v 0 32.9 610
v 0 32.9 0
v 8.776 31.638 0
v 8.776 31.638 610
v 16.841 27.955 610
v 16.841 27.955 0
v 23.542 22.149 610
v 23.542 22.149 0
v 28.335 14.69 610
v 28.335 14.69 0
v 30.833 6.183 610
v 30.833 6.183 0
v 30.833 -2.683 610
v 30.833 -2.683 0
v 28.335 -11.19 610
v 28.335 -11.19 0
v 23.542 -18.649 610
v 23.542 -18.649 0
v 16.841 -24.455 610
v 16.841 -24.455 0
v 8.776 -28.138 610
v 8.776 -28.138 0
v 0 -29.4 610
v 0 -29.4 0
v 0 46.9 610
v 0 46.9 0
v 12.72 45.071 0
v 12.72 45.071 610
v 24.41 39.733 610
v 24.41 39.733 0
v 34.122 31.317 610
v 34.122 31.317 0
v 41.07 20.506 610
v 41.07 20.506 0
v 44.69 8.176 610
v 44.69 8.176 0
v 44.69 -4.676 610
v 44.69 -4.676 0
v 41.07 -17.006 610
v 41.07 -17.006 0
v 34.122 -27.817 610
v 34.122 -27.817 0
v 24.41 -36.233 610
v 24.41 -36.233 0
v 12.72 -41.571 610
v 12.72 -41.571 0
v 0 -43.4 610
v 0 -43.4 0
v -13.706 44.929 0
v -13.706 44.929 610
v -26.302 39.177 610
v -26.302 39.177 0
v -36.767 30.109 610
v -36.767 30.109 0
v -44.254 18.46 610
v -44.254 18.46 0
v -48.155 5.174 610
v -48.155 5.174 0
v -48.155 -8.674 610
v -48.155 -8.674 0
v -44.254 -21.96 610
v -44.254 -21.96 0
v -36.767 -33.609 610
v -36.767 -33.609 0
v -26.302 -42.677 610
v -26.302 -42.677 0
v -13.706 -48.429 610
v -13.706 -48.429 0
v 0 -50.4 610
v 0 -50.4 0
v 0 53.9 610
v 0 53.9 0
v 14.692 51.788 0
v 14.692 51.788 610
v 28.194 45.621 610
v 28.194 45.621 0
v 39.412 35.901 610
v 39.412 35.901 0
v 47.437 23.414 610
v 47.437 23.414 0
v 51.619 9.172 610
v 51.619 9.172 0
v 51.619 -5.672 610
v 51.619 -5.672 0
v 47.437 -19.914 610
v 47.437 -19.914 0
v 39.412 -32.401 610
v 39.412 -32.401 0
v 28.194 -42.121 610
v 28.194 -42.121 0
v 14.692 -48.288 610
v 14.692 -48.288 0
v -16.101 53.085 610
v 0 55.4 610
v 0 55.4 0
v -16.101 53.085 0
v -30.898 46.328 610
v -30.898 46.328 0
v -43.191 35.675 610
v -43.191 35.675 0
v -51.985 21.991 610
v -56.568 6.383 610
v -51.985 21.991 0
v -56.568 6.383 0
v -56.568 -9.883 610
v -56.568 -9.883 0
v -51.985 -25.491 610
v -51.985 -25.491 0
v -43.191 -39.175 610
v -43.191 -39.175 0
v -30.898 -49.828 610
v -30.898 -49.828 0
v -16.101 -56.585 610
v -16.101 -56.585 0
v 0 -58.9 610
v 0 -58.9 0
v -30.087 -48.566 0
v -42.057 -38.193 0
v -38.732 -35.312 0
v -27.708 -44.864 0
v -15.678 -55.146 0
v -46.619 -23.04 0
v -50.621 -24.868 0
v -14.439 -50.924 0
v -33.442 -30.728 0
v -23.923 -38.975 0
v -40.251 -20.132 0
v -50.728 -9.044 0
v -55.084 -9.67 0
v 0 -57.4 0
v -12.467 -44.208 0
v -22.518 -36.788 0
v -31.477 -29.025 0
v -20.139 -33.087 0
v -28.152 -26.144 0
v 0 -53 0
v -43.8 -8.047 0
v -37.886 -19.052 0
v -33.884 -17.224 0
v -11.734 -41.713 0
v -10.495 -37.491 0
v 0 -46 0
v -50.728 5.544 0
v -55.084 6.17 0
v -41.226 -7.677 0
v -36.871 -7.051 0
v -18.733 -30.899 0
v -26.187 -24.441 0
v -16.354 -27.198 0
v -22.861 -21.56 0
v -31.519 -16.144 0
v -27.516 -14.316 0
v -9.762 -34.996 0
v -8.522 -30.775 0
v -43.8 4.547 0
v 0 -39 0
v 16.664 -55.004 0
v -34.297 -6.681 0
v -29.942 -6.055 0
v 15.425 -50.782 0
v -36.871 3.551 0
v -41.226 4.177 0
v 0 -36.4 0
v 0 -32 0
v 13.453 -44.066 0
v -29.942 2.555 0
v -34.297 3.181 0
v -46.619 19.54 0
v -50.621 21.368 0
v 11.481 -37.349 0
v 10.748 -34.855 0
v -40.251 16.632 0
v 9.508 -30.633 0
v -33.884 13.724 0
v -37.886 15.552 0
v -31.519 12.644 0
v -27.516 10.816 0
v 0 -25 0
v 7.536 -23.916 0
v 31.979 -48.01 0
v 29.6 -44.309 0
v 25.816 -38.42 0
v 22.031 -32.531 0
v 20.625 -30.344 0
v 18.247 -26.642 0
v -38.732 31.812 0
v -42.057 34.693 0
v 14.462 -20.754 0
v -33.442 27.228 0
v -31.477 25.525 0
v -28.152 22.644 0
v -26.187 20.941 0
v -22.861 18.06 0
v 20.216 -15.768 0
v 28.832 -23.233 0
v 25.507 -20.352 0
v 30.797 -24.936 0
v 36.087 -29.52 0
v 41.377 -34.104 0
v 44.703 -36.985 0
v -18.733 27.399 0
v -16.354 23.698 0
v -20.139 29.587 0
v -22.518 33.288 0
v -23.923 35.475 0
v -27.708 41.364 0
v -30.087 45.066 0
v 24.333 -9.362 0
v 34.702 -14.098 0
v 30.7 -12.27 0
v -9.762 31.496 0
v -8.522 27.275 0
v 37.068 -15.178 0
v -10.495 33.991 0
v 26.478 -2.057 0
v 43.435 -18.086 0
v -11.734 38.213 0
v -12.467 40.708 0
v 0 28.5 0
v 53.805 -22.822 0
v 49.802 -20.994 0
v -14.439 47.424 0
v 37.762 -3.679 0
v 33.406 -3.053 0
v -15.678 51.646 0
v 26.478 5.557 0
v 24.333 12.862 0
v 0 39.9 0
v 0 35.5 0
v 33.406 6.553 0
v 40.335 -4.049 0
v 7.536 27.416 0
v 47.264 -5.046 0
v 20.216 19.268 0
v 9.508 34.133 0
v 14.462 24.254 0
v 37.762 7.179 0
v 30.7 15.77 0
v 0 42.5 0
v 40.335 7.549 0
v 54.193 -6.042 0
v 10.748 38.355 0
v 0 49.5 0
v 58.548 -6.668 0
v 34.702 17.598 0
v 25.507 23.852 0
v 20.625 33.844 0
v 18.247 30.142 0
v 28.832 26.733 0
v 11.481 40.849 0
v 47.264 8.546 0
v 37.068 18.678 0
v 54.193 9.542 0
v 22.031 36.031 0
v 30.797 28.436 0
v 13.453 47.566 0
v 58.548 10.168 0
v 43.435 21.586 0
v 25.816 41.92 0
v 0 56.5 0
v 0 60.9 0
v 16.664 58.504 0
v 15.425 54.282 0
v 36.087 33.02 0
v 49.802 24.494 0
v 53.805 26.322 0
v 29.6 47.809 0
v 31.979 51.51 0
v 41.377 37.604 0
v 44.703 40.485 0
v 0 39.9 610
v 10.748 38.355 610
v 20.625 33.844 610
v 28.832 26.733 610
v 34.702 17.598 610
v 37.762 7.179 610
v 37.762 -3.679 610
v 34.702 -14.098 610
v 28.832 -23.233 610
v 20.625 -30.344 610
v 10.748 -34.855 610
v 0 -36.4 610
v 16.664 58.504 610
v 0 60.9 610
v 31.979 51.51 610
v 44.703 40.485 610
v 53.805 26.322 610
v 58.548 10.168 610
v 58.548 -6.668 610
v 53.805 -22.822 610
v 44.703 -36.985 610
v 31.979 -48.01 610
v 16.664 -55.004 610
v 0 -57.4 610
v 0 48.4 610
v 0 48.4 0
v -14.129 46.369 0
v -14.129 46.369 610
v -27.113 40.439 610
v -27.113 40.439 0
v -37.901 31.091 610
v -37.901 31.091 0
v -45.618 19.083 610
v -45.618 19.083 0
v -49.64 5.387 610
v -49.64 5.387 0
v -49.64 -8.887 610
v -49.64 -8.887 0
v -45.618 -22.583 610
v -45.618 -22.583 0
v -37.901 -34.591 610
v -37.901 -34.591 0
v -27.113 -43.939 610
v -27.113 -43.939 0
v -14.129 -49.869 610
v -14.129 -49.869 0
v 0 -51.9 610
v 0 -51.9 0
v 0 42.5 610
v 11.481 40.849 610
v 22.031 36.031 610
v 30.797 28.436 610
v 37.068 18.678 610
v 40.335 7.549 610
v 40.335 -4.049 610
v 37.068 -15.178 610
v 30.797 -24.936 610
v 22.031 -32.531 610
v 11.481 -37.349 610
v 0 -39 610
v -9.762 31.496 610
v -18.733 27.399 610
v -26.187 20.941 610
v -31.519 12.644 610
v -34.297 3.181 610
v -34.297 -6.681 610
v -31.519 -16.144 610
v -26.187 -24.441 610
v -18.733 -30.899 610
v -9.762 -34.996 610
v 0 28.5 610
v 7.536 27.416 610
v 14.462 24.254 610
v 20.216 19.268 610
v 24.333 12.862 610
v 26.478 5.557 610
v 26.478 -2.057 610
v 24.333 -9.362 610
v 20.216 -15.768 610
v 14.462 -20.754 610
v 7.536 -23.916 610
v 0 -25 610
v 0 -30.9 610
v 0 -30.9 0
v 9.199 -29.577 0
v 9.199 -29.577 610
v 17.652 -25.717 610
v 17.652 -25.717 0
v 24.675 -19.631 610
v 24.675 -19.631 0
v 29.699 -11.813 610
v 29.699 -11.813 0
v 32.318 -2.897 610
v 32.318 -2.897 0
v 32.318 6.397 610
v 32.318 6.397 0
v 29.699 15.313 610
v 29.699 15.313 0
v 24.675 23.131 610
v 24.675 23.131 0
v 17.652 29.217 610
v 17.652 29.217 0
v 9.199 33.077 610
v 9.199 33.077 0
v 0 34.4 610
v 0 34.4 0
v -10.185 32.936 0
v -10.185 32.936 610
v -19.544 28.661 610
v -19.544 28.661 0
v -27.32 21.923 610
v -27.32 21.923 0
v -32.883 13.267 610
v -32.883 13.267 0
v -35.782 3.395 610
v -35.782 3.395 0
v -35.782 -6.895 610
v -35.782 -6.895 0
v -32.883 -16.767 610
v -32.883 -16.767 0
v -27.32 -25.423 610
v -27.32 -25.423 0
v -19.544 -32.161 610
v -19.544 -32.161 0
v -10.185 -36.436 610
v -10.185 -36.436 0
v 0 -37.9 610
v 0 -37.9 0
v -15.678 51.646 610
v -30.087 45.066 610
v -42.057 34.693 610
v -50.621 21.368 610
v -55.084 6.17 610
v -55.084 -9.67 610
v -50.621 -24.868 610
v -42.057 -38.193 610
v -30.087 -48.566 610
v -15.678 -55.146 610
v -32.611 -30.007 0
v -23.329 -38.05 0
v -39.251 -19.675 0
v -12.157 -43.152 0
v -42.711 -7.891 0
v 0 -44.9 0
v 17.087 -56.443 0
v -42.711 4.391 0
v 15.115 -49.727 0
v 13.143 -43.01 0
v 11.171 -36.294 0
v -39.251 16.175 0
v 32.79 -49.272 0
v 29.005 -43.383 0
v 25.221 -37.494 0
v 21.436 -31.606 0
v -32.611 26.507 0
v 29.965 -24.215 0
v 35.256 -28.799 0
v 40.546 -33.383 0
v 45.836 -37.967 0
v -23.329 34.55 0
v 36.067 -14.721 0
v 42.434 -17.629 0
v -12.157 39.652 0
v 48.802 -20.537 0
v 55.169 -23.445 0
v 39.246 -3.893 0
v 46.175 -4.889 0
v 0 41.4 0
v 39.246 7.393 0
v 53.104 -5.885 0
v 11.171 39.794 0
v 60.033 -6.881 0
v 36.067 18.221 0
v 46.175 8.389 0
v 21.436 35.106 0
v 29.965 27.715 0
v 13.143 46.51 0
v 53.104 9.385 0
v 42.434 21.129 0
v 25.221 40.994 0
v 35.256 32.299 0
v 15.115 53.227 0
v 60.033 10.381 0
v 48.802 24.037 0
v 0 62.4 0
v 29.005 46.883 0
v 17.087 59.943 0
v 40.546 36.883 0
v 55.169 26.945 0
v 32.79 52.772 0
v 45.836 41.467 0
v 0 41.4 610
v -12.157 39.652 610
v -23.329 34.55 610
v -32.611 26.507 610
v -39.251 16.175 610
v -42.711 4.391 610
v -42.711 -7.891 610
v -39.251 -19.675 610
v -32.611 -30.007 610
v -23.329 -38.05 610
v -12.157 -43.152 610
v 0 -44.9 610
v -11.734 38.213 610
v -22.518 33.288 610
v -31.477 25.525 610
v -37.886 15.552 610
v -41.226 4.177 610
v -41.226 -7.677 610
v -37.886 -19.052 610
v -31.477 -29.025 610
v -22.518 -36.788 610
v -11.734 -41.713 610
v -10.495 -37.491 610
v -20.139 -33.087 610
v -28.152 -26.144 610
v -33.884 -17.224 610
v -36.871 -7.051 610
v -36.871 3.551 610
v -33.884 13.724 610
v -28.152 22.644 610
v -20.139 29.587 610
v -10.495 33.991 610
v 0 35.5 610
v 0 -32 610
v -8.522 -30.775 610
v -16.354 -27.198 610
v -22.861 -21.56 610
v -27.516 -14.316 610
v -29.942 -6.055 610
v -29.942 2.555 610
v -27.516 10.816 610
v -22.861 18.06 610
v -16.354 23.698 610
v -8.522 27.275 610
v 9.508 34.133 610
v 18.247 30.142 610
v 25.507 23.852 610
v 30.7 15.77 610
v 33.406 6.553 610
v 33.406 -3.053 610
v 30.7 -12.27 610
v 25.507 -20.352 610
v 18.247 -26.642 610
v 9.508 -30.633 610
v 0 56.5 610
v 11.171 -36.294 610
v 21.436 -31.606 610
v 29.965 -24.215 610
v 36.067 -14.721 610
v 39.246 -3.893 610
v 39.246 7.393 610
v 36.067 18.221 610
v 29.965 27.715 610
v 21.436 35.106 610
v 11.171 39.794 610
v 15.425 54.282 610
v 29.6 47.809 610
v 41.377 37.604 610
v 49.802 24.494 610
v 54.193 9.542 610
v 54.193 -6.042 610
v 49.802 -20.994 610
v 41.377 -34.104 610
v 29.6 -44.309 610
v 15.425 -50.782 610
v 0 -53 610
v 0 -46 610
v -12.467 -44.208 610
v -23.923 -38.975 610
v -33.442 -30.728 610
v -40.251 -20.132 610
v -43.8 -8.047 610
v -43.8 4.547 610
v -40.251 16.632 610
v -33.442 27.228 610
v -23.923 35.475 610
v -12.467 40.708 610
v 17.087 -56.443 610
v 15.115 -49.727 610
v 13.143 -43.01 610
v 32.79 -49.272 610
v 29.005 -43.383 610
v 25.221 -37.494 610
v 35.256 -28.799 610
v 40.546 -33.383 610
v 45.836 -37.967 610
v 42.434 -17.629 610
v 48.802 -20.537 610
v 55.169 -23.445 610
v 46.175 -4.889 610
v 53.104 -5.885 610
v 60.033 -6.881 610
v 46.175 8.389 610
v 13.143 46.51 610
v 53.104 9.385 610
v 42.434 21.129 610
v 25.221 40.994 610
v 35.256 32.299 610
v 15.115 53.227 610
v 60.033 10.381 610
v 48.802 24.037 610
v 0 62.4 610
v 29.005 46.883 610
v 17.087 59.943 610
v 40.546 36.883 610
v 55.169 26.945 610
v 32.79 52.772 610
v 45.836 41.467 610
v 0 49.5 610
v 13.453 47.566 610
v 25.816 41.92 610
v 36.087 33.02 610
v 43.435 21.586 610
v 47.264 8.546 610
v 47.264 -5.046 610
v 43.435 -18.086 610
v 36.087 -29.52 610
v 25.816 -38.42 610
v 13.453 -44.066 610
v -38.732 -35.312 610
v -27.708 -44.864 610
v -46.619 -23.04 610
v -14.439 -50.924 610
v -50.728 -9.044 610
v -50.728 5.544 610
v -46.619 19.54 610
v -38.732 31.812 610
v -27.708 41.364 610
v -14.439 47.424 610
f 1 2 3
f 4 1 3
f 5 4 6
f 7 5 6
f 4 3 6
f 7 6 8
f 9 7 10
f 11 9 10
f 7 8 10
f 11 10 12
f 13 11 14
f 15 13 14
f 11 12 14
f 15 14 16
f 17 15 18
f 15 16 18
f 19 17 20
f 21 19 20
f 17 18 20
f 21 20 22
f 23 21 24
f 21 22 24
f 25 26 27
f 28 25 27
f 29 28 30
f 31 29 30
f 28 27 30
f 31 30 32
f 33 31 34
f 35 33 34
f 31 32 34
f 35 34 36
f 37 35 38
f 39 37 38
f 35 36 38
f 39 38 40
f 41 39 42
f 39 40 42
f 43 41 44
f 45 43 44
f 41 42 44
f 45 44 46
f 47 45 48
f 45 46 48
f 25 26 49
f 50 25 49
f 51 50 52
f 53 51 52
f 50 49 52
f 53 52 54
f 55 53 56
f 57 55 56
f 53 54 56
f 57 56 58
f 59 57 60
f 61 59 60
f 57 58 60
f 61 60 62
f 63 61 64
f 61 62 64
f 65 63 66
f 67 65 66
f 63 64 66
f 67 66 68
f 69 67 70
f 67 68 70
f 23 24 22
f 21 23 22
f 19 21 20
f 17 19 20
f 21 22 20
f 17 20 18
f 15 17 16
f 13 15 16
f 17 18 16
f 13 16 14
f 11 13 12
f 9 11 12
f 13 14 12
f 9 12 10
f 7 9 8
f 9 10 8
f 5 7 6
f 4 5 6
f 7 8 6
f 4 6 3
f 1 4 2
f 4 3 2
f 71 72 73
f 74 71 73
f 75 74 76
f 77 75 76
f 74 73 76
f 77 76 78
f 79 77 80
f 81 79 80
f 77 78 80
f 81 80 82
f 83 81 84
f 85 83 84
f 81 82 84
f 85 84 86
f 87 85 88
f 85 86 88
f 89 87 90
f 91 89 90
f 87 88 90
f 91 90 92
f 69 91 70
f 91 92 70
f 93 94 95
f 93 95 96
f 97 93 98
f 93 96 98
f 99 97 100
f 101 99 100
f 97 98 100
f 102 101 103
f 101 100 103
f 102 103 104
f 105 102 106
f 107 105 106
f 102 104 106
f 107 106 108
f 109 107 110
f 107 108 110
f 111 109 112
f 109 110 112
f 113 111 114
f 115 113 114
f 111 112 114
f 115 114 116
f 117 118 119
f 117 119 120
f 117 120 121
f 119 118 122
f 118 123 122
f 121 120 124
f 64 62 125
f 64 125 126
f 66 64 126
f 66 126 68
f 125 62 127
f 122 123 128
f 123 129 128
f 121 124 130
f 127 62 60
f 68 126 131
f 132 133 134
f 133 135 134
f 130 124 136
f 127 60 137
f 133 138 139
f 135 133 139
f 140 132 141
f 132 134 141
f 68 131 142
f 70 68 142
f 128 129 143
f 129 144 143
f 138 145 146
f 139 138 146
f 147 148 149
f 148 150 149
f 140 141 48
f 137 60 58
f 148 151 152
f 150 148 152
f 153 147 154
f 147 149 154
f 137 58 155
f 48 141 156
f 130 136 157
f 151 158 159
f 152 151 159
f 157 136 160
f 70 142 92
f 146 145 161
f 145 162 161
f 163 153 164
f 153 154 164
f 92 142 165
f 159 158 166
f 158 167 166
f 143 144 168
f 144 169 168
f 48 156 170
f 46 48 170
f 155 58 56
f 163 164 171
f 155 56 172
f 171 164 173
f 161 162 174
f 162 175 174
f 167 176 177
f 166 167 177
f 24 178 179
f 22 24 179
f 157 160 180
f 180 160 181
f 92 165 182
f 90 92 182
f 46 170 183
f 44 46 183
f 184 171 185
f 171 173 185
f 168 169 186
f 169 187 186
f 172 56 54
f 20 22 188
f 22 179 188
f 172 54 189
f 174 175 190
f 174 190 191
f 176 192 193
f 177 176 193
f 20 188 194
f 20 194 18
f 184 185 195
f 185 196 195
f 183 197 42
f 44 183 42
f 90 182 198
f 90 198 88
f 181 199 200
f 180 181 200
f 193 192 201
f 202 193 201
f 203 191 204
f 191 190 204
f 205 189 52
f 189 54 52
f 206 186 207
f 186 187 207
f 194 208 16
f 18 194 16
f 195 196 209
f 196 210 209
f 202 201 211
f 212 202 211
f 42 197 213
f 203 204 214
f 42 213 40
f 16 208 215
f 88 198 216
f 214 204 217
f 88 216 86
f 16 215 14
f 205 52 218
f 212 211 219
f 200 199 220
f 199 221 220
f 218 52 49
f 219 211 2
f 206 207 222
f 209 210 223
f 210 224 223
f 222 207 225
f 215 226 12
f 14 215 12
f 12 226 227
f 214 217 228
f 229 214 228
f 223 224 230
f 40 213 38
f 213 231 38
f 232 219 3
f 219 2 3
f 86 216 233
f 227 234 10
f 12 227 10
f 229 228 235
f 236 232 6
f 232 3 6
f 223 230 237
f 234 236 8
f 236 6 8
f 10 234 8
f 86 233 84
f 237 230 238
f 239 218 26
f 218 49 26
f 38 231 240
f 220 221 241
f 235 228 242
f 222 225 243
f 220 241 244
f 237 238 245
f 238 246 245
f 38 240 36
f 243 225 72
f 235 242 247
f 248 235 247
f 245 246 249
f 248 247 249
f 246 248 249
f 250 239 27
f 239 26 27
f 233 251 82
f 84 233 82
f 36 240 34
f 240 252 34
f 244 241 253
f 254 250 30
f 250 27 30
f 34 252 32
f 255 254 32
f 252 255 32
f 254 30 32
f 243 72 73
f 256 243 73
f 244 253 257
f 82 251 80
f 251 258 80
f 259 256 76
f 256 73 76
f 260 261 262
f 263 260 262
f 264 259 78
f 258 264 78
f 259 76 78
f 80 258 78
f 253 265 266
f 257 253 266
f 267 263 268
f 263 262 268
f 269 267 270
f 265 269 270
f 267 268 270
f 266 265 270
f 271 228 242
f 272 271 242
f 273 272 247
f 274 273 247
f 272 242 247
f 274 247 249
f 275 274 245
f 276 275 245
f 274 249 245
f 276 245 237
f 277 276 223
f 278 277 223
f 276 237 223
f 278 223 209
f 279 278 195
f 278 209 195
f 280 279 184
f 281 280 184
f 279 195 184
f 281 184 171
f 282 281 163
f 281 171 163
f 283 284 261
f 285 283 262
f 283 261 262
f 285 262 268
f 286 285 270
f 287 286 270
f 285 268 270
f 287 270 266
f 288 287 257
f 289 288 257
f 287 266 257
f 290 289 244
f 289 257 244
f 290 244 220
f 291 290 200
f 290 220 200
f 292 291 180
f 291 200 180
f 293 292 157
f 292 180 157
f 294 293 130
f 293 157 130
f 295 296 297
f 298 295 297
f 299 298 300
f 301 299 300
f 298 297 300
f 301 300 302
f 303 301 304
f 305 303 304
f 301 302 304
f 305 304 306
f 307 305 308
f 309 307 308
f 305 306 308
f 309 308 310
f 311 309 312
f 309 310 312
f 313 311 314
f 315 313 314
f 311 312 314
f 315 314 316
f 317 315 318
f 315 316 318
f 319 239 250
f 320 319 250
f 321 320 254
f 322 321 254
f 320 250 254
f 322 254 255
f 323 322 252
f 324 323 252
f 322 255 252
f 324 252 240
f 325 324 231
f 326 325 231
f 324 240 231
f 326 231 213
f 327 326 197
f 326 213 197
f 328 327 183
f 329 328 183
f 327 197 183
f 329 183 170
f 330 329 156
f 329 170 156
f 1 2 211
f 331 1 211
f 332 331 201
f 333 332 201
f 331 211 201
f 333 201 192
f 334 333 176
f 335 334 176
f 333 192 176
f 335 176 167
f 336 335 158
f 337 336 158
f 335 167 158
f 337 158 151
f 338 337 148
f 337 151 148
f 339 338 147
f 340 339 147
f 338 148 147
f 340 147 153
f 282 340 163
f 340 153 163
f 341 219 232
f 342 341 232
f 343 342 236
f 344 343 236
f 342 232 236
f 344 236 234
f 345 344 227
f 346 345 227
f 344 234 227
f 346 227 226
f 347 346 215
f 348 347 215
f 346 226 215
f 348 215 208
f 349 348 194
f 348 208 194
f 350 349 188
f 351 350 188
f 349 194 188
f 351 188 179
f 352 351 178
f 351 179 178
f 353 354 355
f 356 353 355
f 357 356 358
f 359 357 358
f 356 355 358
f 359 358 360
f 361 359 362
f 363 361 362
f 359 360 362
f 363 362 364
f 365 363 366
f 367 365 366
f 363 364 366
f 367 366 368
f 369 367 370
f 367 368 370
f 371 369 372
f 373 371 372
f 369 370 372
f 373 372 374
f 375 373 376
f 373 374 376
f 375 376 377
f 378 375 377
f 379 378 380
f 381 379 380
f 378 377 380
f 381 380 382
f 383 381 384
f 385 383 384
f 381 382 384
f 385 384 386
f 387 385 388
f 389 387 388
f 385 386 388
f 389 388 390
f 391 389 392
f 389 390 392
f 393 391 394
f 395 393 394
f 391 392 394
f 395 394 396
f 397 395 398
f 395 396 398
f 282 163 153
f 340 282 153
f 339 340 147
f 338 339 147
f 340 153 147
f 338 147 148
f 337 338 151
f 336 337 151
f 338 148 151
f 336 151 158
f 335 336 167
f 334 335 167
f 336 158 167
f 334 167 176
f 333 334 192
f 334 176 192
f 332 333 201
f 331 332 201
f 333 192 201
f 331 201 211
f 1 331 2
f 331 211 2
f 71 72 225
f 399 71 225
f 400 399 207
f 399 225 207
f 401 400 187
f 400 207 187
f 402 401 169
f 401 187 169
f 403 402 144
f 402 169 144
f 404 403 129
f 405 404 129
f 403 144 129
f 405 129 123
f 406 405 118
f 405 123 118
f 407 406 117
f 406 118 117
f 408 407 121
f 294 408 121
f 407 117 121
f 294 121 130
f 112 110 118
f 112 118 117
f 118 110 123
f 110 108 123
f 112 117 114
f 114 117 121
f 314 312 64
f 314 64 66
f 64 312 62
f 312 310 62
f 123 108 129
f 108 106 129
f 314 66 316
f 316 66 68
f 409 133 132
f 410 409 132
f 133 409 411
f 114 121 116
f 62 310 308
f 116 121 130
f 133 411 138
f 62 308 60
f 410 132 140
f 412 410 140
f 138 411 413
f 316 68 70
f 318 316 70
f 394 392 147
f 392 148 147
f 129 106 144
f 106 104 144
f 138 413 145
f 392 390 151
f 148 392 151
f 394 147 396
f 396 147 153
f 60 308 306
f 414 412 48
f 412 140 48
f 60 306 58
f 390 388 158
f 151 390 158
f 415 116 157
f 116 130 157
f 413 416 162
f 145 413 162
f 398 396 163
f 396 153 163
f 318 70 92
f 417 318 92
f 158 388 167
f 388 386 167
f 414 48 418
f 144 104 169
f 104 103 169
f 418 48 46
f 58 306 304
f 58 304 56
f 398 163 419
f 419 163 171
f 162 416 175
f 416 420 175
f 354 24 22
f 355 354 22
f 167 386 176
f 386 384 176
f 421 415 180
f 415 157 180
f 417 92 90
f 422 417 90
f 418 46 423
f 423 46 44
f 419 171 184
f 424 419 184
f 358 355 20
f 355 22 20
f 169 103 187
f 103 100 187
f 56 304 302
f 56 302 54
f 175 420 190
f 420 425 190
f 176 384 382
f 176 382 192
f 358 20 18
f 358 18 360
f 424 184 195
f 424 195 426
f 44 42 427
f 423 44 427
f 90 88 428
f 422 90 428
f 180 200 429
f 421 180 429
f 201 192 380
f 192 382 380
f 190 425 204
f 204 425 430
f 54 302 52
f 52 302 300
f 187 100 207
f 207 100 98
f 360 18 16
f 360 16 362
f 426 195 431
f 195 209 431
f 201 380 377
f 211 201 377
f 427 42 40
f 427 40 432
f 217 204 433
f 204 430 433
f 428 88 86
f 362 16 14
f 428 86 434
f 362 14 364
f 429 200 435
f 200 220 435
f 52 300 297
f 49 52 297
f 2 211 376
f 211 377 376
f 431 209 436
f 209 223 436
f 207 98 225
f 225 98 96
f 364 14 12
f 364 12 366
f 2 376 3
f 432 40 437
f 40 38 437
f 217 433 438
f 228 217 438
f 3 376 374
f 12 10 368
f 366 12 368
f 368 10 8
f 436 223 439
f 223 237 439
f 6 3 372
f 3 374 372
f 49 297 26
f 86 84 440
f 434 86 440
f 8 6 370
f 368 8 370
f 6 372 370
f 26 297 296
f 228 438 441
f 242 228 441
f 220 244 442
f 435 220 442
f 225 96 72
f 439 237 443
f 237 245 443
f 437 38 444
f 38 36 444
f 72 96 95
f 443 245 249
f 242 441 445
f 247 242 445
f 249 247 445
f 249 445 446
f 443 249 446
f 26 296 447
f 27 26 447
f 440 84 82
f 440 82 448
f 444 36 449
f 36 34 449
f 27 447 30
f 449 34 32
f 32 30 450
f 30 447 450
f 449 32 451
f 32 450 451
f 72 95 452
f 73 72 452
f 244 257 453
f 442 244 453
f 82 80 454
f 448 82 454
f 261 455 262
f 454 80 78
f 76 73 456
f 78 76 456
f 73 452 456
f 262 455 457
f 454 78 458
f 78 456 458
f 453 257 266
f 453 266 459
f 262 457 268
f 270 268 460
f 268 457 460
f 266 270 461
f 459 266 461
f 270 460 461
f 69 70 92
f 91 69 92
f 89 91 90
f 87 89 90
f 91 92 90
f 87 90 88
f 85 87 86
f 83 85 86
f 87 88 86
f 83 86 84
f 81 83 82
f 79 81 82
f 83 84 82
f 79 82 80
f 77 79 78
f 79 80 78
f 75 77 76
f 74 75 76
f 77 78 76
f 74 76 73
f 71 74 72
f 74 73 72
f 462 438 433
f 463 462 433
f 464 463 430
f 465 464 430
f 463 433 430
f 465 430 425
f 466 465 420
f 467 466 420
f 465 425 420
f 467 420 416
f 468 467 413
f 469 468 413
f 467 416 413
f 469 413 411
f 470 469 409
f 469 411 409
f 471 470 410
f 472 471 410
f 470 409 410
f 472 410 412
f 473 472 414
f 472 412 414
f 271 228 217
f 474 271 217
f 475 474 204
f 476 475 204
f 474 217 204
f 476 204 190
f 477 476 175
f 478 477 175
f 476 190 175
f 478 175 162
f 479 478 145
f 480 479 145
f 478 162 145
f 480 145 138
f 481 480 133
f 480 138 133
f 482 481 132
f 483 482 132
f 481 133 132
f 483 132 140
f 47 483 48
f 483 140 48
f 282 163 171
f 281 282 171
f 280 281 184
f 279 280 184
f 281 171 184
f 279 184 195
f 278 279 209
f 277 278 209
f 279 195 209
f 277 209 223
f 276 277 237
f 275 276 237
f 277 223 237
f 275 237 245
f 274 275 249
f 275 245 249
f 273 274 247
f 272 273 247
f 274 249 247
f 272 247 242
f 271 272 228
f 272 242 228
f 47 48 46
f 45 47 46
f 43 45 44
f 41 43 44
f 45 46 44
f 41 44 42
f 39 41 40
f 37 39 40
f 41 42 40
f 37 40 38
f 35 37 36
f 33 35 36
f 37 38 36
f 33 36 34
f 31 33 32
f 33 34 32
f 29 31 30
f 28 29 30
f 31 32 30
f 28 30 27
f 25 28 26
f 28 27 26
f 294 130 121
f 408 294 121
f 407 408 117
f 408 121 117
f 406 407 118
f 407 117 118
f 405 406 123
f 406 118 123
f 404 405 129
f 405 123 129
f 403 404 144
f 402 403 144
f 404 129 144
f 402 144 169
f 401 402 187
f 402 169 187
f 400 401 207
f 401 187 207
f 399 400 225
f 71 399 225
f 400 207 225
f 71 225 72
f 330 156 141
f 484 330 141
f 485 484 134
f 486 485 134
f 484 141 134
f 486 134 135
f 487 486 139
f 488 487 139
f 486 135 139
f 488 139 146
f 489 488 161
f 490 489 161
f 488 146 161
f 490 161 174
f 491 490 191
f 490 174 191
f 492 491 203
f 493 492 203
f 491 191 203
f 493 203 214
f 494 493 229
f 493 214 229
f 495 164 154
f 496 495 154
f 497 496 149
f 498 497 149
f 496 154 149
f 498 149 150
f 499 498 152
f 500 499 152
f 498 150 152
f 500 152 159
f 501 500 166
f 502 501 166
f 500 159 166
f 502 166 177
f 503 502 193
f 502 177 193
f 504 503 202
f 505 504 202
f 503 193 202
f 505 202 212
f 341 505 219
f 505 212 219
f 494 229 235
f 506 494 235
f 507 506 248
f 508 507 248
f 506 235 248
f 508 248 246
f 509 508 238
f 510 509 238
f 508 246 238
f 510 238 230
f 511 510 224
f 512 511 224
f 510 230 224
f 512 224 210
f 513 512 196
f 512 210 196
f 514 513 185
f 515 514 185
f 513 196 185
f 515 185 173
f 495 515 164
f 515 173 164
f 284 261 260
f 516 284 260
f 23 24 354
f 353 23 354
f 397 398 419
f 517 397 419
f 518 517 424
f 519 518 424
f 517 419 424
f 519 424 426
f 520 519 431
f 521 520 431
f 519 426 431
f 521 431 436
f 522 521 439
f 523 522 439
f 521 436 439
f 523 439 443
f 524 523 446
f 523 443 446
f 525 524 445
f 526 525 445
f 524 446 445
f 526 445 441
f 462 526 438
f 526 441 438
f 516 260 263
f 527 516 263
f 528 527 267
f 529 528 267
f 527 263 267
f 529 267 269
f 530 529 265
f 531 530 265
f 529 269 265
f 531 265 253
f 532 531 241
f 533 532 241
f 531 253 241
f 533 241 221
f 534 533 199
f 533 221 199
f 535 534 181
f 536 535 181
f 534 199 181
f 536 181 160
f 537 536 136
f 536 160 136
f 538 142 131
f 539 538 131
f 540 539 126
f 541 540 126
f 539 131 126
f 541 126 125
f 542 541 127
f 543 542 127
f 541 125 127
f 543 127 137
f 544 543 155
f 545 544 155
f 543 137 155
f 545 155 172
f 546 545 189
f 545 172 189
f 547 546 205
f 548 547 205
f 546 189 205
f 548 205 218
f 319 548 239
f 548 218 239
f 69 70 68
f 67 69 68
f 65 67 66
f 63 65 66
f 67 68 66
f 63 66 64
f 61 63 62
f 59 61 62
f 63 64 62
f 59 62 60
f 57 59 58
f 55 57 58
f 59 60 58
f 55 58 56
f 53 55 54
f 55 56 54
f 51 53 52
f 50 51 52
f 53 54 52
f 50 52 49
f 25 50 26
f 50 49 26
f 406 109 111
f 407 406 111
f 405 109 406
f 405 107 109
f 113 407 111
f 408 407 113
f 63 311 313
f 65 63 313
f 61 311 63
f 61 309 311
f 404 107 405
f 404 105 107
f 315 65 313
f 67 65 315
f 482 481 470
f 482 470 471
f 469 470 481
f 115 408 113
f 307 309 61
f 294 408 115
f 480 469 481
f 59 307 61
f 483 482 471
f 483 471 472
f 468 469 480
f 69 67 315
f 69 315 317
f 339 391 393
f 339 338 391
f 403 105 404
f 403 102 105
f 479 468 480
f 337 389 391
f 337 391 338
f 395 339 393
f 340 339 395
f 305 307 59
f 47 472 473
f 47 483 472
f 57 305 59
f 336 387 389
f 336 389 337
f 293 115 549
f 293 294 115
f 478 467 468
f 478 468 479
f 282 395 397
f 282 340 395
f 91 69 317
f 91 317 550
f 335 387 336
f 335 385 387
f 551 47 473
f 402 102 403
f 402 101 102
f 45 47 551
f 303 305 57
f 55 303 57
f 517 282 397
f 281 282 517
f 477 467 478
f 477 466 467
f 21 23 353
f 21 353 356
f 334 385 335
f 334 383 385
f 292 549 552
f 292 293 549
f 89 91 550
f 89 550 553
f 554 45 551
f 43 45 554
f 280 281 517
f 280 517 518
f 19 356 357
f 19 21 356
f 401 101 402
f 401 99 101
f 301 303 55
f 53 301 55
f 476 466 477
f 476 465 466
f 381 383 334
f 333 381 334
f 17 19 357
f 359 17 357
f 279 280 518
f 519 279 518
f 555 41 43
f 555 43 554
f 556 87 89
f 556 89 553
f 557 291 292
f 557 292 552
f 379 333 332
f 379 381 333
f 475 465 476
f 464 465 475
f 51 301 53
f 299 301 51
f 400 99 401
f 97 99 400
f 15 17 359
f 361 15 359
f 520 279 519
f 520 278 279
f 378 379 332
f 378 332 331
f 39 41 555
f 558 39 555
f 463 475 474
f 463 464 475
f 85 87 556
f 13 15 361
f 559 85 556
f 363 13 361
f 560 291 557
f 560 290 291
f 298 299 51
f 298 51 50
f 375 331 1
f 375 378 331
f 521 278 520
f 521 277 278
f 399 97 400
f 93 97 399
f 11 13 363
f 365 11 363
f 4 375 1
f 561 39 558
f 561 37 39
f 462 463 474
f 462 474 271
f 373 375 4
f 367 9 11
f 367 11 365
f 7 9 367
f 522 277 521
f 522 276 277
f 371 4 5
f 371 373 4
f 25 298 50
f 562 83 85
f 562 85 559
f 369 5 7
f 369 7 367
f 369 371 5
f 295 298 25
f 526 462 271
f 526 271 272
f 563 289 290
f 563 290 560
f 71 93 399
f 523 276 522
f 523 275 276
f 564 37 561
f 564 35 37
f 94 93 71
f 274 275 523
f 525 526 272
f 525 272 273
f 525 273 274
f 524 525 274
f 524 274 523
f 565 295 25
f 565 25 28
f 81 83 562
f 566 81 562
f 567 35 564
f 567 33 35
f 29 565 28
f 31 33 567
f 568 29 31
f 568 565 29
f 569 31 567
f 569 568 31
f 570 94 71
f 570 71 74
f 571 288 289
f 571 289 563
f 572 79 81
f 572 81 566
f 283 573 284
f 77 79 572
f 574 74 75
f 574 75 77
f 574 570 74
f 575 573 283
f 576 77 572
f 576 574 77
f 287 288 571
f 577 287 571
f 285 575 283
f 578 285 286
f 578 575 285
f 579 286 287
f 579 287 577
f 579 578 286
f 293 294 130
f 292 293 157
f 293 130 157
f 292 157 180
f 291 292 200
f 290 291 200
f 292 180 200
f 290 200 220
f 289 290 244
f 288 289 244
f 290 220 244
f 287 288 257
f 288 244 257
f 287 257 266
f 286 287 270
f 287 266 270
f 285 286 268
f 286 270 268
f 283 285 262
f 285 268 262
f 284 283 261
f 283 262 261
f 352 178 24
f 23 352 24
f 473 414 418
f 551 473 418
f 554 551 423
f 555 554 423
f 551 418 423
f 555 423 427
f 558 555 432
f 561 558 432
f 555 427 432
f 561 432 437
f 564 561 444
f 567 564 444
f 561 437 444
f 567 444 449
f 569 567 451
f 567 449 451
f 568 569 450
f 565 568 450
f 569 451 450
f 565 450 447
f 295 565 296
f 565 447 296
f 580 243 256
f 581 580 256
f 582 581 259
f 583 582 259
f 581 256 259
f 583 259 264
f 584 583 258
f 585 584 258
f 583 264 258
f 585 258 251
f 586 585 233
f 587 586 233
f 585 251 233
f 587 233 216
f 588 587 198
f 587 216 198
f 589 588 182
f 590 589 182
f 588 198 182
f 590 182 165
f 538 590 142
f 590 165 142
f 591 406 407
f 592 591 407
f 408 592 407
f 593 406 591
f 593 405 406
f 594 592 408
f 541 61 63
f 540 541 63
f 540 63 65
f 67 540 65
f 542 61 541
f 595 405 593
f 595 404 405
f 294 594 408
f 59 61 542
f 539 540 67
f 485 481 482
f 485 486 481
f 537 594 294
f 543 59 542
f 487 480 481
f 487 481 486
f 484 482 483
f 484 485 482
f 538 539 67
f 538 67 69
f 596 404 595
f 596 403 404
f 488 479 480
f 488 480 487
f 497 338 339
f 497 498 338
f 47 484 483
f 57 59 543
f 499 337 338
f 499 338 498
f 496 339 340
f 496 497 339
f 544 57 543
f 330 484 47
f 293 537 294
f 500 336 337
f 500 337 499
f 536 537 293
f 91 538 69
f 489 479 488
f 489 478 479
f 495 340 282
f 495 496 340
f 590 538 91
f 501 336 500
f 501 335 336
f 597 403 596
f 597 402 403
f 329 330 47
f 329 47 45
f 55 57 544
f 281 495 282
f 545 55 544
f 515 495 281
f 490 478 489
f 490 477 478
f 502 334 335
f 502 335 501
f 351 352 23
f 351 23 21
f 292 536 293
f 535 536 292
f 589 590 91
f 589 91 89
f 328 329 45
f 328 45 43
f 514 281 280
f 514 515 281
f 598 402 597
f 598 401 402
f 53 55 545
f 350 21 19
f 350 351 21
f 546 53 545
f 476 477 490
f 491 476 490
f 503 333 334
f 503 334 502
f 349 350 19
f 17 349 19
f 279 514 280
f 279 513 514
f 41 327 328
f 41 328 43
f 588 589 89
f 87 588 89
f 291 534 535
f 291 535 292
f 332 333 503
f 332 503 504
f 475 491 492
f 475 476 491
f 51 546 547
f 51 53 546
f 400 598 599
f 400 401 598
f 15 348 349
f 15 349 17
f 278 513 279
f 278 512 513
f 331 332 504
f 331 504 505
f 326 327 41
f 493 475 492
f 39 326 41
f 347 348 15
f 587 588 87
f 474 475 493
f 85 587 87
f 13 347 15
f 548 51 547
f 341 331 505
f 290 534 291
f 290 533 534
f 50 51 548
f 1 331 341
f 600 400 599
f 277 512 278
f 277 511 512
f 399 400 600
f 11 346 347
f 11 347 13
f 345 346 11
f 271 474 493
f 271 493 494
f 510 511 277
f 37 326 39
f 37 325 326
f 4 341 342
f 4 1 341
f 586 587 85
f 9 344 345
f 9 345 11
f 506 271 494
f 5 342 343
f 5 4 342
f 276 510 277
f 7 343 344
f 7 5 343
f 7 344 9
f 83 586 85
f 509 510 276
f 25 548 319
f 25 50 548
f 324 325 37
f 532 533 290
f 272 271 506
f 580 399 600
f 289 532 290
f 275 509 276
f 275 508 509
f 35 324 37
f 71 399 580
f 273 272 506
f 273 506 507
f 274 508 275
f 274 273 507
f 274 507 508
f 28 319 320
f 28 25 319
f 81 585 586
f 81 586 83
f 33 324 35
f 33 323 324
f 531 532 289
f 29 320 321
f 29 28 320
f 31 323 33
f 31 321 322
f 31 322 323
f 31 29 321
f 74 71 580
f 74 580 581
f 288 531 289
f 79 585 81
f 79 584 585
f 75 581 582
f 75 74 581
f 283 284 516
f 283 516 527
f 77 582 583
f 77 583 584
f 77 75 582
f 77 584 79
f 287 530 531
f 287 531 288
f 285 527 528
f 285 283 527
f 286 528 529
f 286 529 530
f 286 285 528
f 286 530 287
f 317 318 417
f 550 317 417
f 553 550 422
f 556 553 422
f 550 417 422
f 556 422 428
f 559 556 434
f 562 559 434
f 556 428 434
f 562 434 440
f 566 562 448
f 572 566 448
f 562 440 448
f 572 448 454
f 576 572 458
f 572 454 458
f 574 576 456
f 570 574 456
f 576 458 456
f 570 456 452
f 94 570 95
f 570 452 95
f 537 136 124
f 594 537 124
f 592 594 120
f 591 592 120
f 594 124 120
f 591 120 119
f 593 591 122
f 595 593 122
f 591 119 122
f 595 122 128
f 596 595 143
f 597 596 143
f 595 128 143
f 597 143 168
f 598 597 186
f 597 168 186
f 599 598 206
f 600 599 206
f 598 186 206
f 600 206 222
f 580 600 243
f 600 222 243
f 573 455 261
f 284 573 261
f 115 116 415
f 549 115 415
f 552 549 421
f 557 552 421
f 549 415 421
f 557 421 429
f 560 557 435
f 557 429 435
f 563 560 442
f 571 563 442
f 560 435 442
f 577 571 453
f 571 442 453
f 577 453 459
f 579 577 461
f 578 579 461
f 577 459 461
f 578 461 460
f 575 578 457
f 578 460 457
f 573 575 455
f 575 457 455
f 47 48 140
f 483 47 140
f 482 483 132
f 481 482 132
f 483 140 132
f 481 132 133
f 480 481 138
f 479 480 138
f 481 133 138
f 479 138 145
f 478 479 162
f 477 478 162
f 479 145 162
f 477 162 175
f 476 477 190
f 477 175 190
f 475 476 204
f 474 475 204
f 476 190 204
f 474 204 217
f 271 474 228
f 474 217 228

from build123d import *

# Parameters (mm, degrees)
F1_DEPTH = 610
F3_DEPTH = 610


# Not quite as in the source:
# - a feature of the source that left no trace in its solid (it failed there, or was rolled back) is left out


with BuildPart() as f1:
    # F0 (on Top) → F1 (new body)
    with BuildSketch(Plane.XY):
        with BuildLine():
            ThreePointArc((0, 28.5), (26.75, 1.75), (0, -25))
            Line((0, -25), (0, -29.399998486))
            ThreePointArc((0, -29.399998486), (31.149998486, 1.75), (0, 32.899998486))
            ThreePointArc((0, 32.899998486), (-34.649998486, -1.75), (0, -36.399998486))
            ThreePointArc((0, -36.399998486), (38.149998486, 1.75), (0, 39.899998486))
            ThreePointArc((0, 39.899998486), (-41.649998486, -1.75), (0, -43.399998486))
            ThreePointArc((0, -43.399998486), (45.149998486, 1.75), (0, 46.899998486))
            ThreePointArc((0, 46.899998486), (-48.649998486, -1.75), (0, -50.399998486))
            ThreePointArc((0, -50.399998486), (52.149998486, 1.75), (0, 53.899998486))
            ThreePointArc((0, 53.899998486), (-55.649998486, -1.75), (0, -57.399998486))
            ThreePointArc((0, -57.399998486), (59.149998486, 1.75), (0, 60.899998486))
            Line((0, 60.899998486), (0, 56.5))
            ThreePointArc((0, 56.5), (54.75, 1.75), (0, -53))
            ThreePointArc((0, -53), (-51.25, -1.75), (0, 49.5))
            ThreePointArc((0, 49.5), (47.75, 1.75), (0, -46))
            ThreePointArc((0, -46), (-44.25, -1.75), (0, 42.5))
            ThreePointArc((0, 42.5), (40.75, 1.75), (0, -39))
            ThreePointArc((0, -39), (-37.25, -1.75), (0, 35.5))
            ThreePointArc((0, 35.5), (33.75, 1.75), (0, -32))
            ThreePointArc((0, -32), (-30.25, -1.75), (0, 28.5))
        make_face()
    extrude(amount=F1_DEPTH)


with BuildPart() as f3:
    # F0 (on Top) → F3 (new body, through all)
    with BuildSketch(Plane.XY):
        with BuildLine():
            ThreePointArc((0, 32.899998486), (31.149998486, 1.75), (0, -29.399998486))
            Line((0, -29.399998486), (0, -30.899998486))
            ThreePointArc((0, -30.899998486), (32.649998486, 1.75), (0, 34.399998486))
            ThreePointArc((0, 34.399998486), (-36.149998486, -1.75), (0, -37.899998486))
            ThreePointArc((0, -37.899998486), (39.649998486, 1.75), (0, 41.399998486))
            ThreePointArc((0, 41.399998486), (-43.149998486, -1.75), (0, -44.899998486))
            ThreePointArc((0, -44.899998486), (46.649998486, 1.75), (0, 48.399998486))
            ThreePointArc((0, 48.399998486), (-50.149998486, -1.75), (0, -51.899998486))
            ThreePointArc((0, -51.899998486), (53.649998486, 1.75), (0, 55.399998486))
            ThreePointArc((0, 55.399998486), (-57.149998486, -1.75), (0, -58.899998486))
            ThreePointArc((0, -58.899998486), (60.649998486, 1.75), (0, 62.399998486))
            Line((0, 62.399998486), (0, 60.899998486))
            ThreePointArc((0, 60.899998486), (59.149998486, 1.75), (0, -57.399998486))
            ThreePointArc((0, -57.399998486), (-55.649998486, -1.75), (0, 53.899998486))
            ThreePointArc((0, 53.899998486), (52.149998486, 1.75), (0, -50.399998486))
            ThreePointArc((0, -50.399998486), (-48.649998486, -1.75), (0, 46.899998486))
            ThreePointArc((0, 46.899998486), (45.149998486, 1.75), (0, -43.399998486))
            ThreePointArc((0, -43.399998486), (-41.649998486, -1.75), (0, 39.899998486))
            ThreePointArc((0, 39.899998486), (38.149998486, 1.75), (0, -36.399998486))
            ThreePointArc((0, -36.399998486), (-34.649998486, -1.75), (0, 32.899998486))
        make_face()
    extrude(amount=F3_DEPTH)


solid = Compound([f1.part, f3.part])
